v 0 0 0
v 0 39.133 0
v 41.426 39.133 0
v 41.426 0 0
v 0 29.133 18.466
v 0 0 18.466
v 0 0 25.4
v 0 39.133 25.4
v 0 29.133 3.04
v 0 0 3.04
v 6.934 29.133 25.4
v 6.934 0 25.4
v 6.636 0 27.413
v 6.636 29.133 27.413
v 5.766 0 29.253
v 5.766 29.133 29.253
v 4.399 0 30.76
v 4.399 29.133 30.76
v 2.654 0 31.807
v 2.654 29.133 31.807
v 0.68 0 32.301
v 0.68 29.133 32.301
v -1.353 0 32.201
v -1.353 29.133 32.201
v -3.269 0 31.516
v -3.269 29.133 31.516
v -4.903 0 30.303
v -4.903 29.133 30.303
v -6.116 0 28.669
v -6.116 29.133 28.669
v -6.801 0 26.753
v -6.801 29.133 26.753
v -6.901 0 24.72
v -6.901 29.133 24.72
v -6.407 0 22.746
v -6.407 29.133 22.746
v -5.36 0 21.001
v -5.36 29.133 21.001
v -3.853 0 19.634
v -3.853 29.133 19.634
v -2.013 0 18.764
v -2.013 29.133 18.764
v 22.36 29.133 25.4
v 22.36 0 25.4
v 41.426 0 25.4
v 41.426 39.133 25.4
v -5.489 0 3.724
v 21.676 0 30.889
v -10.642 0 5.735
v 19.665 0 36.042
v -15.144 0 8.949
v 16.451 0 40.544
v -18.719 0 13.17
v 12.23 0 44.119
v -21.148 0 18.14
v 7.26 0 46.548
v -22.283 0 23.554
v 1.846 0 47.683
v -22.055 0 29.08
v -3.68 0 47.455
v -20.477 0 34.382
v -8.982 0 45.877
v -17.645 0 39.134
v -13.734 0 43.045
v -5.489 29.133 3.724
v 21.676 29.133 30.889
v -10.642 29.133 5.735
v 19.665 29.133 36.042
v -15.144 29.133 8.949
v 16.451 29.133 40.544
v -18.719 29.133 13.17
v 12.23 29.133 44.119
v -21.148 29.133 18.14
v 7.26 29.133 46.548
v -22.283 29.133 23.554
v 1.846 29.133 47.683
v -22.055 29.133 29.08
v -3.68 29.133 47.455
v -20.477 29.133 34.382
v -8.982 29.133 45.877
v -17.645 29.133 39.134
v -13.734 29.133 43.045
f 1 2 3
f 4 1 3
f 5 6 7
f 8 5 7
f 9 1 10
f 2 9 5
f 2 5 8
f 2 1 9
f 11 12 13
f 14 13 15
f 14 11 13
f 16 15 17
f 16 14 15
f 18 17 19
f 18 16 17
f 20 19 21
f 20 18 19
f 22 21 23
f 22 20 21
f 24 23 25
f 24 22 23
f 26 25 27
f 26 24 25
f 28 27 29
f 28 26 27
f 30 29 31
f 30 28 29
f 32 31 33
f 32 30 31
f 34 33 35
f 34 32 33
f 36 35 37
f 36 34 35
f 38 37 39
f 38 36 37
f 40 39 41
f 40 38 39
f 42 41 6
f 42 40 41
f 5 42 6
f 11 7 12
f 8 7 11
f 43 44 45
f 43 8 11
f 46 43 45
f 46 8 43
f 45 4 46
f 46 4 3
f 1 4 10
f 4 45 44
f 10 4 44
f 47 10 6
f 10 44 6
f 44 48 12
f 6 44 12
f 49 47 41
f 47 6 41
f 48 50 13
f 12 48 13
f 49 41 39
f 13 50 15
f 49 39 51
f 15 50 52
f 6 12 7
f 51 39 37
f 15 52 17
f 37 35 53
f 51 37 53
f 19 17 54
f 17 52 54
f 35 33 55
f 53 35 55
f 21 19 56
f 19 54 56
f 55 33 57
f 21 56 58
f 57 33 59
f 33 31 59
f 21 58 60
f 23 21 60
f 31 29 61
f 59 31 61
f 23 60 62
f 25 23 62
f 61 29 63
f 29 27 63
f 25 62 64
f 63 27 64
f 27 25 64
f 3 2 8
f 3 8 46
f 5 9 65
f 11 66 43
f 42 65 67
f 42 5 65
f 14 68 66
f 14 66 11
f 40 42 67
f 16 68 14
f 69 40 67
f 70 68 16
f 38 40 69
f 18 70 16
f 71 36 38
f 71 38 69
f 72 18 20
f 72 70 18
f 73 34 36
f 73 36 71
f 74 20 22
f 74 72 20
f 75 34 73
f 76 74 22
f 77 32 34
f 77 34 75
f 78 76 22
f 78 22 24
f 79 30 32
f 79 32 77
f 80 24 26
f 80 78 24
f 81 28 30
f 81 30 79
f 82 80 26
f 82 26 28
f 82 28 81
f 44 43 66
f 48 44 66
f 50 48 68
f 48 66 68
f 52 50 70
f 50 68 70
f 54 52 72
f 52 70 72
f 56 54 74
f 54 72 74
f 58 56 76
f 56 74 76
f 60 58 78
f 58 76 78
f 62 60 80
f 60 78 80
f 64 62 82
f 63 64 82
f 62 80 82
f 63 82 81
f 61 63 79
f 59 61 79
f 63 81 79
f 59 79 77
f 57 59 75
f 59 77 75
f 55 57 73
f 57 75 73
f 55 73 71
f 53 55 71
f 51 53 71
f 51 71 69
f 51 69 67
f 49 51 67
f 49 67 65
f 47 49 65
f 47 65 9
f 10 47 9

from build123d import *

# Parameters (mm, degrees)
F0_W     = 41.426465
F0_H     = 39.133079
F1_DEPTH = 25.4
F2_W     = 15.425408
F2_H     = 29.133079


with BuildPart() as f1:
    # F0 (on Top) → F1 (new body)
    with BuildSketch(Plane.XY):
        with Locations((20.713233, 19.566539)):
            Rectangle(F0_W, F0_H)
    extrude(amount=F1_DEPTH)

    # F2 (on face) → F3 (revolve)
    with BuildSketch(Plane.XY.offset(25.4)):
        with Locations((14.647124, 14.566539)):
            Rectangle(F2_W, F2_H)
    revolve(axis=Axis((0, 19.56654, 25.4), (0, -1, 0)))


solid = f1.part
